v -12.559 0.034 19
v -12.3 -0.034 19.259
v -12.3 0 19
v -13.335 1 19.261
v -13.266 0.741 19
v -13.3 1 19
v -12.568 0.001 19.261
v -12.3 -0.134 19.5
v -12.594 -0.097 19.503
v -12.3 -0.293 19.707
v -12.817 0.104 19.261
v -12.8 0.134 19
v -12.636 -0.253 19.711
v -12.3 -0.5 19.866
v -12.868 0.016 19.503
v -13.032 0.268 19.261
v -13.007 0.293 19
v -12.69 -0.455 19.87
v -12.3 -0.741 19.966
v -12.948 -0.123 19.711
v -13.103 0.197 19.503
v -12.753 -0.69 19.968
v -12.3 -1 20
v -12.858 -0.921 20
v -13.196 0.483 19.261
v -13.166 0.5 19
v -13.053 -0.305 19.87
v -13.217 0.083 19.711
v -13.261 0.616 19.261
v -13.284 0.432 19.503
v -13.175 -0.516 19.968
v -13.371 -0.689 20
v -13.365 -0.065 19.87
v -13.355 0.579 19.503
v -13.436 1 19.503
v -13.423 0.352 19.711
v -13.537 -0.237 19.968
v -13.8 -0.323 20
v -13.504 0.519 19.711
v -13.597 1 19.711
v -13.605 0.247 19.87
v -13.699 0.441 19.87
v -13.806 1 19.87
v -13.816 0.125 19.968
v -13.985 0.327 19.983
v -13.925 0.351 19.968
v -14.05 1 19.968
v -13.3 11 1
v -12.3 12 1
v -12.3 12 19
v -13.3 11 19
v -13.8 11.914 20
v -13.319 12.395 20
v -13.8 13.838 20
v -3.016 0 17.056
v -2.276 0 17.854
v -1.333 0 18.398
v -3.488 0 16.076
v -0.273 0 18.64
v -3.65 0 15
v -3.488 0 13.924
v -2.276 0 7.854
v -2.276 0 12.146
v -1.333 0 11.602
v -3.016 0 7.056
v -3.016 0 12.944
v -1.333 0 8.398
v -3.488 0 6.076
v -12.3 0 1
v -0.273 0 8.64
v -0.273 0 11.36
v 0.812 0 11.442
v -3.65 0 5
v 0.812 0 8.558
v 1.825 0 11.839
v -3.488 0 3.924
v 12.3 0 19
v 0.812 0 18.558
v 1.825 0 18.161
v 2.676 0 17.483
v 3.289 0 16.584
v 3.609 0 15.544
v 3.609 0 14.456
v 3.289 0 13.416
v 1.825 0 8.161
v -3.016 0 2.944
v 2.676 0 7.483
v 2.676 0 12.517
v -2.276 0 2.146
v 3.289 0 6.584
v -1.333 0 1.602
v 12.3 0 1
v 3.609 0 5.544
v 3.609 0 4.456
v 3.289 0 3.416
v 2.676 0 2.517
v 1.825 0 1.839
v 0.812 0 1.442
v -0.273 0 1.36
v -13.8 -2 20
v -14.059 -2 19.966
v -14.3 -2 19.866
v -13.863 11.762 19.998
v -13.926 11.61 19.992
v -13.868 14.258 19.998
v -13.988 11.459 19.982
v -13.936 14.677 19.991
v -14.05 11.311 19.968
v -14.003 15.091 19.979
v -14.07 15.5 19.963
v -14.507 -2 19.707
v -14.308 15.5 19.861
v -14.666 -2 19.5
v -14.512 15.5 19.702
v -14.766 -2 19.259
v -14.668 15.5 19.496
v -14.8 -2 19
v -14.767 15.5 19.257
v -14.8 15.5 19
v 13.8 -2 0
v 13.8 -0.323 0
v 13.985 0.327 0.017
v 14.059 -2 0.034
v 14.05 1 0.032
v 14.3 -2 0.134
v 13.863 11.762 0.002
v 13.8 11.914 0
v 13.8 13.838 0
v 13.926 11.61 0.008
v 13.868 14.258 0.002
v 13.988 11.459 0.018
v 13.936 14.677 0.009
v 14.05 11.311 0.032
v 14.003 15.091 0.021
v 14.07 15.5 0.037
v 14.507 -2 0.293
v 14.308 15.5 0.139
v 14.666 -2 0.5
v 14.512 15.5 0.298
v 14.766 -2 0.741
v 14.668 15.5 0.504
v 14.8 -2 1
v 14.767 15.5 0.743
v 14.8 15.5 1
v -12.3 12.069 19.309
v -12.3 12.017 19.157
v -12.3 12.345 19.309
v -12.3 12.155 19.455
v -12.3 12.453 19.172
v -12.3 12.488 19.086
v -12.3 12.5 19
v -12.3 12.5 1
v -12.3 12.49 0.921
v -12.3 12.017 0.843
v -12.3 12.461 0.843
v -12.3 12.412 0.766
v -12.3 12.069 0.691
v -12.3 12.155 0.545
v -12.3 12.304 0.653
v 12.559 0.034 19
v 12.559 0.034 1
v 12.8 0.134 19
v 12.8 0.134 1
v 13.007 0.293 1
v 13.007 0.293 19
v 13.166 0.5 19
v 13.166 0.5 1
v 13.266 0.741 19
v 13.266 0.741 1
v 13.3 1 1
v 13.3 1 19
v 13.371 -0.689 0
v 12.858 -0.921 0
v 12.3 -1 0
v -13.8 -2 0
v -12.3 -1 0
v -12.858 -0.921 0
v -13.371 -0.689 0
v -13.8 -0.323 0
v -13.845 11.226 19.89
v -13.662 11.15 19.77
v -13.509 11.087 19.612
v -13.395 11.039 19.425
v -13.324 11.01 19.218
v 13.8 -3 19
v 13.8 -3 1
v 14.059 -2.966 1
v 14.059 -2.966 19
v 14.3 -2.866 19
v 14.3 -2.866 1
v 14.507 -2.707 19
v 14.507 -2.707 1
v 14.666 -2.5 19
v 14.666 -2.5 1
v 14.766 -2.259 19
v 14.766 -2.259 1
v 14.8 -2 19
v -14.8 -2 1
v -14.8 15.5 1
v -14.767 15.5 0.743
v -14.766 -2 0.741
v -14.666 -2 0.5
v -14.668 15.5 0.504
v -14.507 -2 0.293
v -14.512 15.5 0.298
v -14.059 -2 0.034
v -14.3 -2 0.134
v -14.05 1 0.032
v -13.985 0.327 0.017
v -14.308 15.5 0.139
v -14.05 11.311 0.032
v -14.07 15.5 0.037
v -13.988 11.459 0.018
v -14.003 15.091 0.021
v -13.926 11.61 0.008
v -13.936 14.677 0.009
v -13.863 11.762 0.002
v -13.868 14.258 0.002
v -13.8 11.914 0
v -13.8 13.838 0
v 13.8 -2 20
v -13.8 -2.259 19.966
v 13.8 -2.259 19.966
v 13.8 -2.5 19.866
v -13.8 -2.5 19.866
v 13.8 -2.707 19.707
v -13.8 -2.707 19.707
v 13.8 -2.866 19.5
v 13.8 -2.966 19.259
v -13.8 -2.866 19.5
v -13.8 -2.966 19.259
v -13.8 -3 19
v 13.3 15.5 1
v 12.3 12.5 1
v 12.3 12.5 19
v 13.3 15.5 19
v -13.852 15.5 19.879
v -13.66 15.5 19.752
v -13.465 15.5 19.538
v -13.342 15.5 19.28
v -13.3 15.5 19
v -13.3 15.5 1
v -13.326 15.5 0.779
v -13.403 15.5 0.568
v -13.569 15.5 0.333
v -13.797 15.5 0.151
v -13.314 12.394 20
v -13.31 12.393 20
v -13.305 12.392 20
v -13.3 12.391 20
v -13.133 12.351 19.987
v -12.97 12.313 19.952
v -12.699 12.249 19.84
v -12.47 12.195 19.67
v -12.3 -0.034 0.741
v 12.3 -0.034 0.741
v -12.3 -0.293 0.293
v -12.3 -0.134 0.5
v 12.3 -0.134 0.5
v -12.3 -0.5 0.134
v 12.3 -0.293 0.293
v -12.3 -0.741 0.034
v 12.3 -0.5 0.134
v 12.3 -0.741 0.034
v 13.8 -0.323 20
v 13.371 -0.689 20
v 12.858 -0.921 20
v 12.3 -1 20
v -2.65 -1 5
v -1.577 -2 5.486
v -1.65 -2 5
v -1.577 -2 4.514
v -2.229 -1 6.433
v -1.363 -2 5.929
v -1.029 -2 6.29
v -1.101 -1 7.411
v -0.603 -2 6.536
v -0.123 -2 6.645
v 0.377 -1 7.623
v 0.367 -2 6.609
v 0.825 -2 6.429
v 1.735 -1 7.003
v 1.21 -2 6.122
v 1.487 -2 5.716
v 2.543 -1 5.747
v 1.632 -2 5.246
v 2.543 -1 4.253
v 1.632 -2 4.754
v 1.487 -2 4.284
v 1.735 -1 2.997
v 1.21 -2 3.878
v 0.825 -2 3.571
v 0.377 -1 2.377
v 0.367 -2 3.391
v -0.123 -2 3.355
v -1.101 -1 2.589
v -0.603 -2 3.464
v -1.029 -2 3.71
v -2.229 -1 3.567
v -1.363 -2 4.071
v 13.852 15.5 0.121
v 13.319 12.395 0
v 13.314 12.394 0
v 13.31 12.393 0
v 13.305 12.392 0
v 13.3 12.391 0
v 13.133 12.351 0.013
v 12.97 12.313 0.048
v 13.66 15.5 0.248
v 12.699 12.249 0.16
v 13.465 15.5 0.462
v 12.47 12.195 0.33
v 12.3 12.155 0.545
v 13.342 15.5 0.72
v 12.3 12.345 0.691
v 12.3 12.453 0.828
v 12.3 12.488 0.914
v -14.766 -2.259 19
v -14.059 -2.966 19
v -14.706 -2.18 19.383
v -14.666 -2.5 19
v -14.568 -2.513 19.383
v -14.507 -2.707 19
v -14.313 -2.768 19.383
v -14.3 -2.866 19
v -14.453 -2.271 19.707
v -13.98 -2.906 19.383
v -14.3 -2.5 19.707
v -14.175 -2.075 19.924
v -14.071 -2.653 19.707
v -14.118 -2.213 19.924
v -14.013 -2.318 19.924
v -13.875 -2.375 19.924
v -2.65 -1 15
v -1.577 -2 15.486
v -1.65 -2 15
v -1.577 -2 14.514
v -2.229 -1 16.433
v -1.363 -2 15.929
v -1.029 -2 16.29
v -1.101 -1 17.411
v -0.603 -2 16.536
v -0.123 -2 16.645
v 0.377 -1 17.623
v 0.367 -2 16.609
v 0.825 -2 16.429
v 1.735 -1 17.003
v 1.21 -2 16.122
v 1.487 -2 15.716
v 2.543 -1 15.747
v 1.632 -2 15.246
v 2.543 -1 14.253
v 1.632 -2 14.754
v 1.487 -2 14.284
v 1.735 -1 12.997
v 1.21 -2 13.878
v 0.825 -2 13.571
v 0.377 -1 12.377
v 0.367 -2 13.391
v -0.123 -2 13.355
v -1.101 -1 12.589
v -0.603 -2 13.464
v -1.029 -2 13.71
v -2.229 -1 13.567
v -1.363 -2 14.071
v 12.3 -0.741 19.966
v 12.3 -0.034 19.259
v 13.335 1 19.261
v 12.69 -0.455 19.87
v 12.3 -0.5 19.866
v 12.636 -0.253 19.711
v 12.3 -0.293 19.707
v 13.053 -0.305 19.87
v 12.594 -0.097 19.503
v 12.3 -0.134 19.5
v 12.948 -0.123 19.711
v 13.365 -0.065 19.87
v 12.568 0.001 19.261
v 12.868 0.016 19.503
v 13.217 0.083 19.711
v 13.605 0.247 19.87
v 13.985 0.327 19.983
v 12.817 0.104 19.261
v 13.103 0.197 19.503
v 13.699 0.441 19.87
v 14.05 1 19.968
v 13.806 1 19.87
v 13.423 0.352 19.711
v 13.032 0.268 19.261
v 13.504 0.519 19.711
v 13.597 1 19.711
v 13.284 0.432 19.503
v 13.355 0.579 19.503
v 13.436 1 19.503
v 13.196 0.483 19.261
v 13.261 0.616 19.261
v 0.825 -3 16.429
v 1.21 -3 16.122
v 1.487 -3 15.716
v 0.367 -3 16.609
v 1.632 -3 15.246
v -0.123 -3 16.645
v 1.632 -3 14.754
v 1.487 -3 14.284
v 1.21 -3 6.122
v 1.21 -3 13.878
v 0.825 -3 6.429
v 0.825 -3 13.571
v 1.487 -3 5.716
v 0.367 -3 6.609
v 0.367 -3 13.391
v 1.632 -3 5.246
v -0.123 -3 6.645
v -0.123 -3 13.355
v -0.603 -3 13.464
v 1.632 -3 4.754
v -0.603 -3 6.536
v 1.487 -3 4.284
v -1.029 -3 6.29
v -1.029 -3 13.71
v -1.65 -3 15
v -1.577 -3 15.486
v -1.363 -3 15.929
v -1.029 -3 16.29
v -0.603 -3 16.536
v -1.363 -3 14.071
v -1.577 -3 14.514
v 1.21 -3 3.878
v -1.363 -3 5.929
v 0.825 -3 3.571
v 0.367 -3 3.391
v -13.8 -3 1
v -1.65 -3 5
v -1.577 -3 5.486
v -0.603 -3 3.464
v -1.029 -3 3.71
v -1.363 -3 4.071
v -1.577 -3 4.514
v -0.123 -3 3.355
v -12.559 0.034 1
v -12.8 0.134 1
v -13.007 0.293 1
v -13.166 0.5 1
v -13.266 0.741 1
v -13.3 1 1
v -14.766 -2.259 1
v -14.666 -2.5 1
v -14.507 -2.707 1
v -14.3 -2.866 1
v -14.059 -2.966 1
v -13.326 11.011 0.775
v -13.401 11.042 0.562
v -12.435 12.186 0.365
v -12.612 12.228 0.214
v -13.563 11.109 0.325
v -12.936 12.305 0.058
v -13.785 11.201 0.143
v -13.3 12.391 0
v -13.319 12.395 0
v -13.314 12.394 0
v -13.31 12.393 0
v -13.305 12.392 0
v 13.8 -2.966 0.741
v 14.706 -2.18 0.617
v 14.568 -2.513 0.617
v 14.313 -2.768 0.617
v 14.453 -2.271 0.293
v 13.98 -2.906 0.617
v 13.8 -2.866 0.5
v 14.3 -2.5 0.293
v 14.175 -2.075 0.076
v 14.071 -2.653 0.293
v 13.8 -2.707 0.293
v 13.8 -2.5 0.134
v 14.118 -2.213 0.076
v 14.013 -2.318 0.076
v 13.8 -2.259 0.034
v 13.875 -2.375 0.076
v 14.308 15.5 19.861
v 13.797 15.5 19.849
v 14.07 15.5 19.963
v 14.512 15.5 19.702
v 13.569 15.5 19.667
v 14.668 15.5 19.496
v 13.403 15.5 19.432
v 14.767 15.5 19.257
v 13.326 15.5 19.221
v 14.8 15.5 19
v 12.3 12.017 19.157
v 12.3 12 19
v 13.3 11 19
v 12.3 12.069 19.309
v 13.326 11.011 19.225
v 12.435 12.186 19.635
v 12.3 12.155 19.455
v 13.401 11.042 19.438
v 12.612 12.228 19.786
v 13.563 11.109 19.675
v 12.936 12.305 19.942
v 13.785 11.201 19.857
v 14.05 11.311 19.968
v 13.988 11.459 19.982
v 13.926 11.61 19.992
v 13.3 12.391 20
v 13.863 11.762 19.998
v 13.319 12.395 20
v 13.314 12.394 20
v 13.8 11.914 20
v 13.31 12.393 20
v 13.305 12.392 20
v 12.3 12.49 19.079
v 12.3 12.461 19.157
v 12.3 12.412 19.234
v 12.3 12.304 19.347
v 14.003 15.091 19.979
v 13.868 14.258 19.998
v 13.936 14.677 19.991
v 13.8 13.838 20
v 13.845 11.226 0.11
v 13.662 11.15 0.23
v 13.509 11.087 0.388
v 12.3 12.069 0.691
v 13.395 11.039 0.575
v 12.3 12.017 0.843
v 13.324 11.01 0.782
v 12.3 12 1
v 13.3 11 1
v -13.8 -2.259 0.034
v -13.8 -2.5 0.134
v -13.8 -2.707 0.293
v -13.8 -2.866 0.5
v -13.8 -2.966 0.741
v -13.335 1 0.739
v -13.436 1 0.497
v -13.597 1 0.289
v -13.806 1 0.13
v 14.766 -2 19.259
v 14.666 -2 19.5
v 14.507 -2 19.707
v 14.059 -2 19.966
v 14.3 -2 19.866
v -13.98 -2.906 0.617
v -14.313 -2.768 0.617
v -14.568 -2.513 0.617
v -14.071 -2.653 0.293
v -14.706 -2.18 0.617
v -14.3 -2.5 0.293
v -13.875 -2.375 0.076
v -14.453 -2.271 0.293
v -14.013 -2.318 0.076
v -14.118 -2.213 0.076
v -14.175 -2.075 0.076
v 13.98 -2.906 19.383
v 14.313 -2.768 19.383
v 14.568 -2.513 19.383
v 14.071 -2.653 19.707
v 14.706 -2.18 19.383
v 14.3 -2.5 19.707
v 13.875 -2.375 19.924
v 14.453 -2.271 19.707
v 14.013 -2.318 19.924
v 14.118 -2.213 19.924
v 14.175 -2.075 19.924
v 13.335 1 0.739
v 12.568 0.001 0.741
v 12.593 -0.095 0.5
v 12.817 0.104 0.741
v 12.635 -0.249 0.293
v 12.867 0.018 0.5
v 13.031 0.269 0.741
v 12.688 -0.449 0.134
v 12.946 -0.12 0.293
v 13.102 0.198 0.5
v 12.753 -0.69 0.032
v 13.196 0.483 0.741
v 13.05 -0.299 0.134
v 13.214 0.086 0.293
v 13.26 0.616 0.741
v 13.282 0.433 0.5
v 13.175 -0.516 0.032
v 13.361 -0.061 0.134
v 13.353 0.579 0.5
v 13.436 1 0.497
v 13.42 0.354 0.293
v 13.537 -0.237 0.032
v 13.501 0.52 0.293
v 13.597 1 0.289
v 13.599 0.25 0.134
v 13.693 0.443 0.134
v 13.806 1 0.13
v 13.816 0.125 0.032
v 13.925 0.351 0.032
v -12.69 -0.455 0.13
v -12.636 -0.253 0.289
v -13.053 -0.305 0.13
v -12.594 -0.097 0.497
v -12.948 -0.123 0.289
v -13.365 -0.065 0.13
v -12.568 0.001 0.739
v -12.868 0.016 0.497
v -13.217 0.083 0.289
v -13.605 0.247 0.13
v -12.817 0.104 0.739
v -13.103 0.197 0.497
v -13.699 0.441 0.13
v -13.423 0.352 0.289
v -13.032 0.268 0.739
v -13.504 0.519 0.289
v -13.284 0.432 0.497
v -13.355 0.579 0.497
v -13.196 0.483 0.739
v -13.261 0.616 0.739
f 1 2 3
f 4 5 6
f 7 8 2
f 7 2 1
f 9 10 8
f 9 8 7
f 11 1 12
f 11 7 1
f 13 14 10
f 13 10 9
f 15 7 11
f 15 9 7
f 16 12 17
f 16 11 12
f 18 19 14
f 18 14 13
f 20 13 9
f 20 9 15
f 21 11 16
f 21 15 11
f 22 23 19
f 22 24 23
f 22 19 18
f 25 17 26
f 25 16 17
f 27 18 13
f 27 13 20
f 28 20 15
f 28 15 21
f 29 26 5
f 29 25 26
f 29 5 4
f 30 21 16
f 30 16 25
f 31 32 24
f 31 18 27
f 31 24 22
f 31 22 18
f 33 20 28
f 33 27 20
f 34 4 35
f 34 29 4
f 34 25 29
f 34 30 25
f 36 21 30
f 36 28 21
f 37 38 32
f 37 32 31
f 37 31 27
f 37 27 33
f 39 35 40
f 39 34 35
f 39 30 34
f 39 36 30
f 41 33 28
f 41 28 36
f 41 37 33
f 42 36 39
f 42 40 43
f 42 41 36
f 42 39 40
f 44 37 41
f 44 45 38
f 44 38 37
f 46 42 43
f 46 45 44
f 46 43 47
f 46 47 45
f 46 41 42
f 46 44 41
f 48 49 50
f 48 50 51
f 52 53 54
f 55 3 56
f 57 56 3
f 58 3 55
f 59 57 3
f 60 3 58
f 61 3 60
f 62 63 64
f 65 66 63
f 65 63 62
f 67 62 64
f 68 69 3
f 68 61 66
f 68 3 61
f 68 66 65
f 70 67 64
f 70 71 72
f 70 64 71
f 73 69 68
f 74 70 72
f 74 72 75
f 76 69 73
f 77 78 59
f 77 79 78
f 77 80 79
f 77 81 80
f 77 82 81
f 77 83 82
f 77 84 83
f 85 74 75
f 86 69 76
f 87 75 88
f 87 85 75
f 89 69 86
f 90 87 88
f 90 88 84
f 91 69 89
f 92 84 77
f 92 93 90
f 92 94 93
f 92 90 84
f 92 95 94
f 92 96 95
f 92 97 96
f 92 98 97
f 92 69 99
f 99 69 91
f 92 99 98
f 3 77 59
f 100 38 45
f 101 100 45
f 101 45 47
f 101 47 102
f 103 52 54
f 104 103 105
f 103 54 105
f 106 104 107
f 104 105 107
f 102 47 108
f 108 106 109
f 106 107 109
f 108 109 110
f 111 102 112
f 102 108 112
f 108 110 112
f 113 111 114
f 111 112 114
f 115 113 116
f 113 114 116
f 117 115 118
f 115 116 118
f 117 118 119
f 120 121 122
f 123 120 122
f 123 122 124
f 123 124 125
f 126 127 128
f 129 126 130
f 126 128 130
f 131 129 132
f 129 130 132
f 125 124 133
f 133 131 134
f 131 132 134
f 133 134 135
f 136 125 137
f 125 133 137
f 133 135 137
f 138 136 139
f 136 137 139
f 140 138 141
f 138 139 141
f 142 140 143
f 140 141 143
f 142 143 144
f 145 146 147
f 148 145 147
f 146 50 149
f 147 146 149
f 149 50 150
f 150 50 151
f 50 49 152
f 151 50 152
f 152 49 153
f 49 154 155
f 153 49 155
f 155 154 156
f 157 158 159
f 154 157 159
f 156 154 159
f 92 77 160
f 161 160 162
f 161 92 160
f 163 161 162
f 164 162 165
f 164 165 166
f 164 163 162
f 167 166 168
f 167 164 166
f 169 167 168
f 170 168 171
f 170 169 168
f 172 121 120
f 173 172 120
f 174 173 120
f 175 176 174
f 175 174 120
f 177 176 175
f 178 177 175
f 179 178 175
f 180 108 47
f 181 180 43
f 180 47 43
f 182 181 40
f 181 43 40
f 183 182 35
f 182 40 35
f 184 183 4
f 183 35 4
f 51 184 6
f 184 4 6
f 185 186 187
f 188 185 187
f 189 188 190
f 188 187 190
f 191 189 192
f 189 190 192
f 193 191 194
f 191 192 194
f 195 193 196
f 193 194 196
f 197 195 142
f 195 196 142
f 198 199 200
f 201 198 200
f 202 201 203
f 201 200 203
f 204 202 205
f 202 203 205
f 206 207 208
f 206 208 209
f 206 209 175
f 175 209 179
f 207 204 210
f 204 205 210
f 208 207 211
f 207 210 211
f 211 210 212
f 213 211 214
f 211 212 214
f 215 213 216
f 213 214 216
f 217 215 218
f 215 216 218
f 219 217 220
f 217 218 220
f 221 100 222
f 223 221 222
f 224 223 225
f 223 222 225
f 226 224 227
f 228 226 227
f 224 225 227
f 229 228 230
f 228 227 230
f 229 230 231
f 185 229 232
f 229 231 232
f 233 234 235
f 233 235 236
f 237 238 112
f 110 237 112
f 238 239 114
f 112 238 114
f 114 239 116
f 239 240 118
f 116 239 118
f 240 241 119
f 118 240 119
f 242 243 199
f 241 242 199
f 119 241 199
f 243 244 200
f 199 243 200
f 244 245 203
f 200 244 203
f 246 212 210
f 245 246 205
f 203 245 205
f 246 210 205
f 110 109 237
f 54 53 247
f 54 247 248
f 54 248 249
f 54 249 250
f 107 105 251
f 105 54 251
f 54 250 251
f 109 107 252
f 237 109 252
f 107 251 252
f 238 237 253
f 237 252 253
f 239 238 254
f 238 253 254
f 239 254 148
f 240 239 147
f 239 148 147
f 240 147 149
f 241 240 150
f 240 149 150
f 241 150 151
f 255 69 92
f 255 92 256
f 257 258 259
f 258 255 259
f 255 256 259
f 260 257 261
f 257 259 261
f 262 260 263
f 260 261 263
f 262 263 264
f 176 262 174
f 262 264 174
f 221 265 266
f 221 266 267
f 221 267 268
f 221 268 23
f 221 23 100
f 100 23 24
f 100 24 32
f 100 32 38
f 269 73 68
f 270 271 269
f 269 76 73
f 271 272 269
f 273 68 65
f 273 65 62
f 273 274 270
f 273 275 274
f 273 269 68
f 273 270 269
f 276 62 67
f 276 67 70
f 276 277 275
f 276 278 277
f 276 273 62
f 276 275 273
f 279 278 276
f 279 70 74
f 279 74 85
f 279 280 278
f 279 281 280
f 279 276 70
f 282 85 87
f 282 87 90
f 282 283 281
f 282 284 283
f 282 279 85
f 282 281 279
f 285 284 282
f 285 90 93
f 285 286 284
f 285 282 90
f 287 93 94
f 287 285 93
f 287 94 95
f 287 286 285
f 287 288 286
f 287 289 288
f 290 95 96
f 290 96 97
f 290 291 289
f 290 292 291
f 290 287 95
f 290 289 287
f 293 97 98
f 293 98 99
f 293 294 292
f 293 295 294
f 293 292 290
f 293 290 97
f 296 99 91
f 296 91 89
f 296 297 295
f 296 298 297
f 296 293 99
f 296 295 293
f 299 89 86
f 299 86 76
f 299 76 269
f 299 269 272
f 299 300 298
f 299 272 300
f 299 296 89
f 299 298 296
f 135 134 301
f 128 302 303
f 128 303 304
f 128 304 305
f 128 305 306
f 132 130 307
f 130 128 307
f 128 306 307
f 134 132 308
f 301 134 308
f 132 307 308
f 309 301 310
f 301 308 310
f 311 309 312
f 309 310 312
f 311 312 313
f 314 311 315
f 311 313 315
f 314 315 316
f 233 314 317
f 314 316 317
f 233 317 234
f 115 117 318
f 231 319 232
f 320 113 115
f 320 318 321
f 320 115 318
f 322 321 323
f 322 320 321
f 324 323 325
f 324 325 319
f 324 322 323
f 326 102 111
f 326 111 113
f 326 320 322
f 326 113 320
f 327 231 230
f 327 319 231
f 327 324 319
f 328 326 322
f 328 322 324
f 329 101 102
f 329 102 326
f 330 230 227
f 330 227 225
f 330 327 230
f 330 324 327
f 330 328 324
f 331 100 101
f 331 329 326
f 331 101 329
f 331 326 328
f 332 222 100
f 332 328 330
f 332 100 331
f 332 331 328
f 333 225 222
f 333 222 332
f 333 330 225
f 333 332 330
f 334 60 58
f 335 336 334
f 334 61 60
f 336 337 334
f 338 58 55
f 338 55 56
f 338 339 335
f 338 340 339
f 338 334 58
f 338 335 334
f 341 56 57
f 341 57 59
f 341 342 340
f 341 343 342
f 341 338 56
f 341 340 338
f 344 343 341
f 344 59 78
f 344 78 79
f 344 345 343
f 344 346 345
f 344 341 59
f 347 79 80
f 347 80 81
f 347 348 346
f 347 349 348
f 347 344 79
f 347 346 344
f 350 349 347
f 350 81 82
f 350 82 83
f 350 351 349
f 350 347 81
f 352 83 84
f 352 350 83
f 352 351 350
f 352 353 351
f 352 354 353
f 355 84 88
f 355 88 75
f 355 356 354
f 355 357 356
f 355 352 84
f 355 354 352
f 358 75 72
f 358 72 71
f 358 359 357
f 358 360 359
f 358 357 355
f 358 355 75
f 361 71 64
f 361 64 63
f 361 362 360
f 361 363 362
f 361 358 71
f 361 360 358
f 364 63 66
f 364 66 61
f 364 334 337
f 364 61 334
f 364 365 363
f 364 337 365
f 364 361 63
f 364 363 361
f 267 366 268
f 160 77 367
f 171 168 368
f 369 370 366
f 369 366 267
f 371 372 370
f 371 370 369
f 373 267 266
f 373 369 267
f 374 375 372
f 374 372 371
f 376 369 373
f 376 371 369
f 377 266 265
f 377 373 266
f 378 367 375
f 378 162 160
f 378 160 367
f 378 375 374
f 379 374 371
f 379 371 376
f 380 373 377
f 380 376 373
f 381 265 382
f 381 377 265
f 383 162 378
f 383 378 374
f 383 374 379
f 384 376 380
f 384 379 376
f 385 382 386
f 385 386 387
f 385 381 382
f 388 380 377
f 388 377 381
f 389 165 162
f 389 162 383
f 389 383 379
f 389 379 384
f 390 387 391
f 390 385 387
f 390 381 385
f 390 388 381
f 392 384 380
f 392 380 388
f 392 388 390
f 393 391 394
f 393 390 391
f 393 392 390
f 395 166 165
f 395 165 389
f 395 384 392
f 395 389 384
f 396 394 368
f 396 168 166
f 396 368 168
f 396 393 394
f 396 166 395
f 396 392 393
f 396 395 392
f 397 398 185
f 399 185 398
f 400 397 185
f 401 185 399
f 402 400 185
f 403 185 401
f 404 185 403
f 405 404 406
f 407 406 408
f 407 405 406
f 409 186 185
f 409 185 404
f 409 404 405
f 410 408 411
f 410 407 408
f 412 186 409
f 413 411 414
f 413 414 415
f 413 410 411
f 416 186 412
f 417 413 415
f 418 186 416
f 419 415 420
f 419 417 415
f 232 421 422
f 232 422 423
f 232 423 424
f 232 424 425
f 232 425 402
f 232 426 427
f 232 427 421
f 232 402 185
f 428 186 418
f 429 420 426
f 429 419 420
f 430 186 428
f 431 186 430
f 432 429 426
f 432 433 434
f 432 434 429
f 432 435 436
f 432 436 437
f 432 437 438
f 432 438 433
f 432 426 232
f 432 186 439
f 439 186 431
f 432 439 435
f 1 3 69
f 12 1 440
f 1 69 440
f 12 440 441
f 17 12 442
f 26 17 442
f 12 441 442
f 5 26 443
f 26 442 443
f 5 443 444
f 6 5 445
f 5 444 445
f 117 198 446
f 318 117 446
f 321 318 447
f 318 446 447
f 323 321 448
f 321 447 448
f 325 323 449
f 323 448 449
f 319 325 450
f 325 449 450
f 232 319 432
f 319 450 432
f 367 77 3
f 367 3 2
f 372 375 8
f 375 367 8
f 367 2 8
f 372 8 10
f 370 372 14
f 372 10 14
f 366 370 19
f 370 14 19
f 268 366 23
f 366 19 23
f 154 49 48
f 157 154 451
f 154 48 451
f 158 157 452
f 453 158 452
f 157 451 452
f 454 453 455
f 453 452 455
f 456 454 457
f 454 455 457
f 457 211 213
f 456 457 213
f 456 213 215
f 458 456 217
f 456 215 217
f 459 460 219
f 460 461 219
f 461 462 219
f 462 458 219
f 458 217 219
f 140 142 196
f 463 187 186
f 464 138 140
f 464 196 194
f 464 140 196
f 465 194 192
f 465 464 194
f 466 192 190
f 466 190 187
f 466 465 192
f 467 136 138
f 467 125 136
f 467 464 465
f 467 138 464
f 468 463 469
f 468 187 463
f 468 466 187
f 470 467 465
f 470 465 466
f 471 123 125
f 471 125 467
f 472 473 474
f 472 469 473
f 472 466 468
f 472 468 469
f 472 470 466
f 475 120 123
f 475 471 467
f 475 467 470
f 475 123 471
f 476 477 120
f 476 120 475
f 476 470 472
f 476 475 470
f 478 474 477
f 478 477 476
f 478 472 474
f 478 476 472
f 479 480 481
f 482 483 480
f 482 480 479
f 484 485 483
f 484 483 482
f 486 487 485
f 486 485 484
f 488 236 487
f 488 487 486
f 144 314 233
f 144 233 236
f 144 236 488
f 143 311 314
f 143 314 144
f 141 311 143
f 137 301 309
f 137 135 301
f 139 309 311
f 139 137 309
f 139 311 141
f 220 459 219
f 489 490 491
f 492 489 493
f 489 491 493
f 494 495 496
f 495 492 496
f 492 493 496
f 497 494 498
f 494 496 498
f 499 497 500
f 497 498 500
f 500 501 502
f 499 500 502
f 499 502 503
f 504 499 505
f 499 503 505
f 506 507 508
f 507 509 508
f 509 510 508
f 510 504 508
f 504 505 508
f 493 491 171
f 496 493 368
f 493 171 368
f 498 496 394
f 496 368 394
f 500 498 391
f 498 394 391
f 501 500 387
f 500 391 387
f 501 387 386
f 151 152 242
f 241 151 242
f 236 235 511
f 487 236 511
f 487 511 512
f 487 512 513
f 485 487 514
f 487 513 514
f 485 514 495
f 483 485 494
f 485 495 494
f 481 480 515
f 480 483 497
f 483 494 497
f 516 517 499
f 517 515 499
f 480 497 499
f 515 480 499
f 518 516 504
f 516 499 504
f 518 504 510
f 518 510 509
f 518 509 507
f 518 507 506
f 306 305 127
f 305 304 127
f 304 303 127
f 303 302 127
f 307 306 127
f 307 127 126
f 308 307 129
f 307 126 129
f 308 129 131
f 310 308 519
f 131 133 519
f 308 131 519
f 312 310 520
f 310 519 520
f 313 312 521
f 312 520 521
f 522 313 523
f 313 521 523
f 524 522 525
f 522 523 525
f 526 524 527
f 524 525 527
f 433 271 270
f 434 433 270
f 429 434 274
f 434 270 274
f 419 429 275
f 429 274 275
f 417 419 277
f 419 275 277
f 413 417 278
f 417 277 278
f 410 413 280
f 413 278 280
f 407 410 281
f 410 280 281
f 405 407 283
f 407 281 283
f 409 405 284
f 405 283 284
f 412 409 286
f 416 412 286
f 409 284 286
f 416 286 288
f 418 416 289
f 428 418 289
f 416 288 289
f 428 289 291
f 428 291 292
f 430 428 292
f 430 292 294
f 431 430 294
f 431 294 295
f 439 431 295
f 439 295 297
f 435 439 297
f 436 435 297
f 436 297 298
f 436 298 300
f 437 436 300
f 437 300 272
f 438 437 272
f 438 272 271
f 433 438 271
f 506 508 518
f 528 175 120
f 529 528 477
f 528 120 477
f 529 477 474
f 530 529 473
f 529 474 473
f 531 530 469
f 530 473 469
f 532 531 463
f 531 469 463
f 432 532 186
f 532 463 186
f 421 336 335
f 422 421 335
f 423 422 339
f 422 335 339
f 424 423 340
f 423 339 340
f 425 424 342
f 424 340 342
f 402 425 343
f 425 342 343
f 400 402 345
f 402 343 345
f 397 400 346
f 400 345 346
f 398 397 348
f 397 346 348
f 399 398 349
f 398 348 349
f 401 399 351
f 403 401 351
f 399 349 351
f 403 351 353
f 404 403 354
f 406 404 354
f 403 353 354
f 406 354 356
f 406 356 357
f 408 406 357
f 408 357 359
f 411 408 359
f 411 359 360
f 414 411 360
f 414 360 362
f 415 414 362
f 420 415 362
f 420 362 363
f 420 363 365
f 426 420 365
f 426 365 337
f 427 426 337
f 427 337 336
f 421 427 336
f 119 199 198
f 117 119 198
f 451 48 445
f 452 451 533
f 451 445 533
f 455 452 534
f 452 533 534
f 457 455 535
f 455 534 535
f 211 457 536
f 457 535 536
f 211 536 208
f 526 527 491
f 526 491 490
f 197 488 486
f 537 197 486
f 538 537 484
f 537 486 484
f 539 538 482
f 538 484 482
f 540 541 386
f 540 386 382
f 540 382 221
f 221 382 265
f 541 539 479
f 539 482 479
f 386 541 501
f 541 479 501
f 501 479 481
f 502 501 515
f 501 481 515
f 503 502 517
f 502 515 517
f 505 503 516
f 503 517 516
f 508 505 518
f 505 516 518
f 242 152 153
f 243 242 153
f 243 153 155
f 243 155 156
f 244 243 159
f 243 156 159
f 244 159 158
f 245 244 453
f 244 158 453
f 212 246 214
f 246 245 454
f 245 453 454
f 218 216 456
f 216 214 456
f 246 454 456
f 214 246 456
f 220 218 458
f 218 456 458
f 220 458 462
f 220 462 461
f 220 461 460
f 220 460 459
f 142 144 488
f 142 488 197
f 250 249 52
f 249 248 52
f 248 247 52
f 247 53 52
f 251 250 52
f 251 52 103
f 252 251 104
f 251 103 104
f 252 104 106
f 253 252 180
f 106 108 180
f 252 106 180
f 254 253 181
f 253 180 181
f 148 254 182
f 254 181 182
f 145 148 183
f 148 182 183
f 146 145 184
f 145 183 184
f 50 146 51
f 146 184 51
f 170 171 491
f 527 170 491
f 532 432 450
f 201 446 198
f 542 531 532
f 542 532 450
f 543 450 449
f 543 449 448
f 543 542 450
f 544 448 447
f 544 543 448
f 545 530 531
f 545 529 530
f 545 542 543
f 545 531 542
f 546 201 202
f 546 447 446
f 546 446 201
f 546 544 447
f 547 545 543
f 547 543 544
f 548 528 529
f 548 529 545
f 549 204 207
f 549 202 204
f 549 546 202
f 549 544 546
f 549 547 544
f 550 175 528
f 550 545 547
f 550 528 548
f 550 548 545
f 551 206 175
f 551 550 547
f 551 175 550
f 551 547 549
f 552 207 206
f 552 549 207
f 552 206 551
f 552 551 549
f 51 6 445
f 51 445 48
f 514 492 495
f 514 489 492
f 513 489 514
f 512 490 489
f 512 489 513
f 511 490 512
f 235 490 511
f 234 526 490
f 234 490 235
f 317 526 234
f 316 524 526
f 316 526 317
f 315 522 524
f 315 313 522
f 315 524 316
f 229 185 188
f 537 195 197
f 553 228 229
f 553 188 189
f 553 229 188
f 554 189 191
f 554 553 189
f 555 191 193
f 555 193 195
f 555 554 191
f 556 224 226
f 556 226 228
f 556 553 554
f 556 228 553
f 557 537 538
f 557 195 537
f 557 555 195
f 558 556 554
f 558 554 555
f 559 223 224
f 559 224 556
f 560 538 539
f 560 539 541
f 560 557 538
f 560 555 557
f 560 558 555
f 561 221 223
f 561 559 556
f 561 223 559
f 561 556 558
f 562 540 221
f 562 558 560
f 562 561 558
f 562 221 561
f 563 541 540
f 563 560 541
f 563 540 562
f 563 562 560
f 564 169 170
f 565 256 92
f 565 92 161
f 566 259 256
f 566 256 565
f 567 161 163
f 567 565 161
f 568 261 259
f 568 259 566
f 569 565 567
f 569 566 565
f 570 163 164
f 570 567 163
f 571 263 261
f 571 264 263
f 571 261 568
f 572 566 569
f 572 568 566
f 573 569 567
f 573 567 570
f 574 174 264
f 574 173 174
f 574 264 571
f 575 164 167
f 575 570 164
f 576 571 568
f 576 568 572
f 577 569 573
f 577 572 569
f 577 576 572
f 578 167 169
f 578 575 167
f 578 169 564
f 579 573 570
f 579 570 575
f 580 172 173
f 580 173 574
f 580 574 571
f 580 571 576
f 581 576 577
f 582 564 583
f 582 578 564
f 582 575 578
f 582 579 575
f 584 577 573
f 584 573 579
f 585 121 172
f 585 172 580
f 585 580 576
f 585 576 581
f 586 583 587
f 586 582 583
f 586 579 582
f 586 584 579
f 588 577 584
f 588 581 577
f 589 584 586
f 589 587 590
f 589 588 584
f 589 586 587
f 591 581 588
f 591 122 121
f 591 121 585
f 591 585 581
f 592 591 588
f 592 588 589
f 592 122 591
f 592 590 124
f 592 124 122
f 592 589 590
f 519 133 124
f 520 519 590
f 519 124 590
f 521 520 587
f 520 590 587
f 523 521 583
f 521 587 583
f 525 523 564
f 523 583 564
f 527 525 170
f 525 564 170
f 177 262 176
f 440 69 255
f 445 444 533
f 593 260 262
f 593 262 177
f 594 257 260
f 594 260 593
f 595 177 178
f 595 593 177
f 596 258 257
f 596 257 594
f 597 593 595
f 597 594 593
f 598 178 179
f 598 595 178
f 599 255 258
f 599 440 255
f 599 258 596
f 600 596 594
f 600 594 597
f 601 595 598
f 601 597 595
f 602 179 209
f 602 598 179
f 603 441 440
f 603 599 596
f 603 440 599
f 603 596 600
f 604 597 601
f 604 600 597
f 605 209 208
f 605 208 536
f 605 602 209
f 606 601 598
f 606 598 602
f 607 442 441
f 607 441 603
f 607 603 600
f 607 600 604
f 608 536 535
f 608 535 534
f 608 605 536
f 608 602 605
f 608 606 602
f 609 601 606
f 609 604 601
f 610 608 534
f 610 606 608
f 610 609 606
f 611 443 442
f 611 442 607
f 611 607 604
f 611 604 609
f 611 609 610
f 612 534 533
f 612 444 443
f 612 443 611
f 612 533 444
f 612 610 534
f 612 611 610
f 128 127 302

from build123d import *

# Parameters (mm, degrees)
BOSS_EXTRUDE1_DEPTH = 20
SKETCH2_R           = 1.65
CUT_EXTRUDE1_DEPTH  = 20
FILLET2_R           = 1
CHAMFER1_SIZE       = 2


with BuildPart() as part:
    # Sketch1 → Boss-Extrude1 (new body)
    with BuildSketch(Plane.XY):
        with BuildLine():
            Line((0, 0), (-12.3, 0))
            ThreePointArc((-12.3, 0), (-13.007106781, 0.292893219), (-13.3, 1))
            Line((-13.3, 1), (-13.3, 11))
            Line((-13.3, 11), (-12.3, 12))
            Line((-12.3, 12), (-12.3, 12.5))
            Line((-12.3, 12.5), (-13.3, 15.5))
            Line((-13.3, 15.5), (-14.8, 15.5))
            Line((-14.8, 15.5), (-14.8, -3))
            Line((-14.8, -3), (0, -3))
            Line((0, -3), (0, 0))
        make_face()
    boss_extrude1 = extrude(amount=BOSS_EXTRUDE1_DEPTH)

    # Mirror1: Boss-Extrude1 across plane
    add(boss_extrude1.mirror(Plane(origin=(0, 0, 20), x_dir=(0, 0, 1), z_dir=(-1, 0, 0))))

    # Sketch2 → Cut-Extrude1 (cut)
    with BuildSketch(Plane(origin=(0, 0, 0), x_dir=(1, 0, 0), z_dir=(0, 1, 0))):
        with Locations(Location((0, -5, 0), (0, 0, 180))):
            Circle(SKETCH2_R)
        with Locations(Location((0, -15, 0), (0, 0, 180))):
            Circle(SKETCH2_R)
    extrude(amount=-CUT_EXTRUDE1_DEPTH, mode=Mode.SUBTRACT)

    # Fillet2
    # the kernel refuses this fillet: 1 mm, written as the material it takes off along each edge
    with BuildSketch(Plane(origin=(-13.8, -2, 1), x_dir=(-1, 0, 0), z_dir=(0, 0, -1))) as fillet2_piece_1_section:
        Polygon((0, 0), (FILLET2_R, 0), (FILLET2_R, -FILLET2_R), (0, -FILLET2_R), align=None)
    fillet2_piece_1 = extrude(amount=FILLET2_R, mode=Mode.PRIVATE)
    fillet2_piece_1 = fillet2_piece_1 - Plane(origin=(-13.8, -2, 1), x_dir=(0.7071067811865475, 0.7071067811865475, 0), z_dir=(0, 0, -1)) * Sphere(FILLET2_R, mode=Mode.PRIVATE)
    add(fillet2_piece_1, mode=Mode.SUBTRACT)
    with BuildSketch(Plane(origin=(13.8, -2, 1), x_dir=(0, -1, 0), z_dir=(0, 0, -1))) as fillet2_piece_2_section:
        Polygon((0, 0), (FILLET2_R, 0), (FILLET2_R, -FILLET2_R), (0, -FILLET2_R), align=None)
    fillet2_piece_2 = extrude(amount=FILLET2_R, mode=Mode.PRIVATE)
    fillet2_piece_2 = fillet2_piece_2 - Plane(origin=(13.8, -2, 1), x_dir=(-0.7071067811865476, 0.7071067811865475, 0), z_dir=(0, 0, -1)) * Sphere(FILLET2_R, mode=Mode.PRIVATE)
    add(fillet2_piece_2, mode=Mode.SUBTRACT)
    with BuildSketch(Plane(origin=(13.8, -2, 19), x_dir=(0, -1, 0), z_dir=(0, 0, 1))) as fillet2_piece_3_section:
        Polygon((0, 0), (FILLET2_R, 0), (FILLET2_R, FILLET2_R), (0, FILLET2_R), align=None)
    fillet2_piece_3 = extrude(amount=FILLET2_R, mode=Mode.PRIVATE)
    fillet2_piece_3 = fillet2_piece_3 - Plane(origin=(13.8, -2, 19), x_dir=(-0.7071067811865476, 0.7071067811865475, 0), z_dir=(0, 0, 1)) * Sphere(FILLET2_R, mode=Mode.PRIVATE)
    add(fillet2_piece_3, mode=Mode.SUBTRACT)
    with BuildSketch(Plane(origin=(-13.8, -2, 19), x_dir=(-1, 0, 0), z_dir=(0, 0, 1))) as fillet2_piece_4_section:
        Polygon((0, 0), (FILLET2_R, 0), (FILLET2_R, FILLET2_R), (0, FILLET2_R), align=None)
    fillet2_piece_4 = extrude(amount=FILLET2_R, mode=Mode.PRIVATE)
    fillet2_piece_4 = fillet2_piece_4 - Plane(origin=(-13.8, -2, 19), x_dir=(0.7071067811865475, 0.7071067811865475, 0), z_dir=(0, 0, 1)) * Sphere(FILLET2_R, mode=Mode.PRIVATE)
    add(fillet2_piece_4, mode=Mode.SUBTRACT)
    with BuildSketch(Plane(origin=(-12.3, 1, 0), x_dir=(0, -1, 0), z_dir=(1, 0, 0))) as fillet2_piece_5:
        with BuildLine():
            CenterArc((1 + FILLET2_R, -FILLET2_R), FILLET2_R, 90, 90)
            Line((1 + FILLET2_R, 0), (1, 0))
            Line((1, 0), (1, -FILLET2_R))
        make_face()
    revolve(axis=Axis((-12.3, 1, 0), (0, 0, -1)), revolution_arc=90, mode=Mode.SUBTRACT)
    with BuildSketch(Plane(origin=(-13.3, 1, 0), x_dir=(-1, 0, 0), z_dir=(0, 1, 0))) as fillet2_piece_6_section:
        with BuildLine():
            CenterArc((FILLET2_R, FILLET2_R), FILLET2_R, 180, 90)
            Line((0, FILLET2_R), (0, 0))
            Line((0, 0), (FILLET2_R, 0))
        make_face()
    fillet2_piece_6 = extrude(amount=12.5, mode=Mode.PRIVATE)
    fillet2_piece_6 = split(fillet2_piece_6, bisect_by=Plane(origin=(-15.966229844, 8.333770156, 0.229204386), z_dir=(0.7071067811865476, -0.7071067811865476, 0)), keep=Keep.TOP, mode=Mode.PRIVATE)
    add(fillet2_piece_6, mode=Mode.SUBTRACT)
    with BuildSketch(Plane(origin=(-15.067766953, 9.232233047, 0), x_dir=(-0.7071067811865476, 0.7071067811865476, 0), z_dir=(0.7071067811865476, 0.7071067811865476, 0))) as fillet2_piece_7_section:
        with BuildLine():
            CenterArc((FILLET2_R, FILLET2_R), FILLET2_R, 180, 90)
            Line((0, FILLET2_R), (0, 0))
            Line((0, 0), (FILLET2_R, 0))
        make_face()
    fillet2_piece_7 = extrude(amount=6.414213562, mode=Mode.PRIVATE)
    fillet2_piece_7 = split(fillet2_piece_7, bisect_by=Plane(origin=(-13.3, 12.610644527, 0.233840359), z_dir=(1, 0, 0)), keep=Keep.TOP, mode=Mode.PRIVATE)
    add(fillet2_piece_7, mode=Mode.SUBTRACT)
    with BuildSketch(Plane(origin=(-11.509430585, 10.128291755, 0), x_dir=(-0.948683298050514, -0.31622776601683744, 0), z_dir=(-0.31622776601683744, 0.948683298050514, 0)), Plane(origin=(11.509430585, 10.128291755, 20), x_dir=(0.9486832980505141, -0.3162277660168372, 0), z_dir=(0.3162277660168372, 0.9486832980505141, 0))) as fillet2_piece_8:
        with BuildLine():
            CenterArc((FILLET2_R, FILLET2_R), FILLET2_R, 180, 90)
            Line((0, FILLET2_R), (0, 0))
            Line((0, 0), (FILLET2_R, 0))
        make_face()
    extrude(amount=8.16227766, mode=Mode.SUBTRACT)
    with BuildSketch(Plane(origin=(-14.8, 18, 0), x_dir=(1, 0, 0), z_dir=(0, -1, 0)), Plane(origin=(14.8, 18, 20), x_dir=(-1, 0, 0), z_dir=(0, -1, 0))) as fillet2_piece_9:
        with BuildLine():
            CenterArc((FILLET2_R, FILLET2_R), FILLET2_R, 180, 90)
            Line((0, FILLET2_R), (0, 0))
            Line((0, 0), (FILLET2_R, 0))
        make_face()
    extrude(amount=20, mode=Mode.SUBTRACT)
    with BuildSketch(Plane(origin=(13.8, -3, 0), x_dir=(0, 1, 0), z_dir=(-1, 0, 0)), Plane(origin=(-13.8, -3, 20), x_dir=(0, 1, 0), z_dir=(1, 0, 0))) as fillet2_piece_10:
        with BuildLine():
            CenterArc((FILLET2_R, -FILLET2_R), FILLET2_R, 90, 90)
            Line((0, -FILLET2_R), (0, 0))
            Line((0, 0), (FILLET2_R, 0))
        make_face()
    extrude(amount=27.6, mode=Mode.SUBTRACT)
    with BuildSketch(Plane(origin=(14.8, 18, 0), x_dir=(-1, 0, 0), z_dir=(0, -1, 0)), Plane(origin=(-14.8, 18, 20), x_dir=(1, 0, 0), z_dir=(0, -1, 0))) as fillet2_piece_11:
        with BuildLine():
            CenterArc((FILLET2_R, -FILLET2_R), FILLET2_R, 90, 90)
            Line((0, -FILLET2_R), (0, 0))
            Line((0, 0), (FILLET2_R, 0))
        make_face()
    extrude(amount=20, mode=Mode.SUBTRACT)
    with BuildSketch(Plane(origin=(11.509430585, 10.128291755, 0), x_dir=(0.9486832980505141, -0.3162277660168372, 0), z_dir=(0.3162277660168372, 0.9486832980505141, 0)), Plane(origin=(-11.509430585, 10.128291755, 20), x_dir=(-0.948683298050514, -0.31622776601683744, 0), z_dir=(-0.31622776601683744, 0.948683298050514, 0))) as fillet2_piece_12:
        with BuildLine():
            CenterArc((FILLET2_R, -FILLET2_R), FILLET2_R, 90, 90)
            Line((0, -FILLET2_R), (0, 0))
            Line((0, 0), (FILLET2_R, 0))
        make_face()
    extrude(amount=8.16227766, mode=Mode.SUBTRACT)
    with BuildSketch(Plane(origin=(15.067766953, 9.232233047, 0), x_dir=(0.7071067811865474, 0.7071067811865478, 0), z_dir=(-0.7071067811865478, 0.7071067811865474, 0))) as fillet2_piece_13_section:
        with BuildLine():
            CenterArc((FILLET2_R, -FILLET2_R), FILLET2_R, 90, 90)
            Line((0, -FILLET2_R), (0, 0))
            Line((0, 0), (FILLET2_R, 0))
        make_face()
    fillet2_piece_13 = extrude(amount=6.414213562, mode=Mode.PRIVATE)
    fillet2_piece_13 = split(fillet2_piece_13, bisect_by=Plane(origin=(13.3, 12.610644527, 0.233840359), z_dir=(-1, 0, 0)), keep=Keep.TOP, mode=Mode.PRIVATE)
    add(fillet2_piece_13, mode=Mode.SUBTRACT)
    with BuildSketch(Plane(origin=(15.067766953, 9.232233047, 20), x_dir=(0.7071067811865474, 0.7071067811865478, 0), z_dir=(-0.7071067811865478, 0.7071067811865474, 0))) as fillet2_piece_14_section:
        with BuildLine():
            CenterArc((FILLET2_R, FILLET2_R), FILLET2_R, 180, 90)
            Line((0, FILLET2_R), (0, 0))
            Line((0, 0), (FILLET2_R, 0))
        make_face()
    fillet2_piece_14 = extrude(amount=6.414213562, mode=Mode.PRIVATE)
    fillet2_piece_14 = split(fillet2_piece_14, bisect_by=Plane(origin=(13.3, 12.610644527, 19.766159641), z_dir=(-1, 0, 0)), keep=Keep.TOP, mode=Mode.PRIVATE)
    add(fillet2_piece_14, mode=Mode.SUBTRACT)
    with BuildSketch(Plane(origin=(13.3, 1, 0), x_dir=(1, 0, 0), z_dir=(0, 1, 0))) as fillet2_piece_15_section:
        with BuildLine():
            CenterArc((FILLET2_R, -FILLET2_R), FILLET2_R, 90, 90)
            Line((0, -FILLET2_R), (0, 0))
            Line((0, 0), (FILLET2_R, 0))
        make_face()
    fillet2_piece_15 = extrude(amount=12.5, mode=Mode.PRIVATE)
    fillet2_piece_15 = split(fillet2_piece_15, bisect_by=Plane(origin=(15.966229844, 8.333770156, 0.229204386), z_dir=(-0.7071067811865474, -0.7071067811865478, 0)), keep=Keep.TOP, mode=Mode.PRIVATE)
    add(fillet2_piece_15, mode=Mode.SUBTRACT)
    with BuildSketch(Plane(origin=(13.3, 1, 20), x_dir=(1, 0, 0), z_dir=(0, 1, 0))) as fillet2_piece_16_section:
        with BuildLine():
            CenterArc((FILLET2_R, FILLET2_R), FILLET2_R, 180, 90)
            Line((0, FILLET2_R), (0, 0))
            Line((0, 0), (FILLET2_R, 0))
        make_face()
    fillet2_piece_16 = extrude(amount=12.5, mode=Mode.PRIVATE)
    fillet2_piece_16 = split(fillet2_piece_16, bisect_by=Plane(origin=(15.966229844, 8.333770156, 19.770795614), z_dir=(-0.7071067811865474, -0.7071067811865478, 0)), keep=Keep.TOP, mode=Mode.PRIVATE)
    add(fillet2_piece_16, mode=Mode.SUBTRACT)
    with BuildSketch(Plane(origin=(12.3, 1, 0), x_dir=(0, -1, 0), z_dir=(-1, 0, 0))) as fillet2_piece_17:
        with BuildLine():
            CenterArc((1 + FILLET2_R, FILLET2_R), FILLET2_R, 180, 90)
            Line((1, FILLET2_R), (1, 0))
            Line((1, 0), (1 + FILLET2_R, 0))
        make_face()
    revolve(axis=Axis((12.3, 1, 0), (0, 0, 1)), revolution_arc=90, mode=Mode.SUBTRACT)
    with BuildSketch(Plane(origin=(12.3, 1, 20), x_dir=(0, -1, 0), z_dir=(-1, 0, 0))) as fillet2_piece_18:
        with BuildLine():
            CenterArc((1 + FILLET2_R, -FILLET2_R), FILLET2_R, 90, 90)
            Line((1, -FILLET2_R), (1, 0))
            Line((1, 0), (1 + FILLET2_R, 0))
        make_face()
    revolve(axis=Axis((12.3, 1, 20), (0, 0, 1)), revolution_arc=90, mode=Mode.SUBTRACT)
    with BuildSketch(Plane(origin=(12.3, 0, 0), x_dir=(0, 0, 1), z_dir=(-1, 0, 0)), Plane(origin=(-12.3, 0, 20), x_dir=(0, 0, -1), z_dir=(1, 0, 0))) as fillet2_piece_19:
        with BuildLine():
            CenterArc((FILLET2_R, -FILLET2_R), FILLET2_R, 90, 90)
            Line((0, -FILLET2_R), (0, 0))
            Line((0, 0), (FILLET2_R, 0))
        make_face()
    extrude(amount=24.6, mode=Mode.SUBTRACT)
    with BuildSketch(Plane(origin=(-15.067766953, 9.232233047, 20), x_dir=(-0.7071067811865476, 0.7071067811865476, 0), z_dir=(0.7071067811865476, 0.7071067811865476, 0))) as fillet2_piece_20_section:
        with BuildLine():
            CenterArc((FILLET2_R, -FILLET2_R), FILLET2_R, 90, 90)
            Line((0, -FILLET2_R), (0, 0))
            Line((0, 0), (FILLET2_R, 0))
        make_face()
    fillet2_piece_20 = extrude(amount=6.414213562, mode=Mode.PRIVATE)
    fillet2_piece_20 = split(fillet2_piece_20, bisect_by=Plane(origin=(-13.3, 12.610644527, 19.766159641), z_dir=(1, 0, 0)), keep=Keep.TOP, mode=Mode.PRIVATE)
    add(fillet2_piece_20, mode=Mode.SUBTRACT)
    with BuildSketch(Plane(origin=(-13.3, 1, 20), x_dir=(-1, 0, 0), z_dir=(0, 1, 0))) as fillet2_piece_21_section:
        with BuildLine():
            CenterArc((FILLET2_R, -FILLET2_R), FILLET2_R, 90, 90)
            Line((0, -FILLET2_R), (0, 0))
            Line((0, 0), (FILLET2_R, 0))
        make_face()
    fillet2_piece_21 = extrude(amount=12.5, mode=Mode.PRIVATE)
    fillet2_piece_21 = split(fillet2_piece_21, bisect_by=Plane(origin=(-15.966229844, 8.333770156, 19.770795614), z_dir=(0.7071067811865476, -0.7071067811865476, 0)), keep=Keep.TOP, mode=Mode.PRIVATE)
    add(fillet2_piece_21, mode=Mode.SUBTRACT)
    with BuildSketch(Plane(origin=(-12.3, 1, 20), x_dir=(0, -1, 0), z_dir=(1, 0, 0))) as fillet2_piece_22:
        with BuildLine():
            CenterArc((1 + FILLET2_R, FILLET2_R), FILLET2_R, 180, 90)
            Line((1 + FILLET2_R, 0), (1, 0))
            Line((1, 0), (1, FILLET2_R))
        make_face()
    revolve(axis=Axis((-12.3, 1, 20), (0, 0, -1)), revolution_arc=90, mode=Mode.SUBTRACT)
    with BuildSketch(Plane(origin=(14.8, -3, 1), x_dir=(-1, 0, 0), z_dir=(0, 0, 1)), Plane(origin=(-14.8, -3, 1), x_dir=(0, 1, 0), z_dir=(0, 0, 1))) as fillet2_piece_23:
        with BuildLine():
            CenterArc((FILLET2_R, -FILLET2_R), FILLET2_R, 90, 90)
            Line((0, -FILLET2_R), (0, 0))
            Line((0, 0), (FILLET2_R, 0))
        make_face()
    extrude(amount=18, mode=Mode.SUBTRACT)
    with BuildSketch(Plane(origin=(-13.3, 1, 0), x_dir=(-1, 0, 0), z_dir=(0, 1, 0))) as fillet2_piece_24a_section:
        with BuildLine():
            CenterArc((FILLET2_R, FILLET2_R), FILLET2_R, 180, 90)
            Line((0, FILLET2_R), (0, 0))
            Line((0, 0), (FILLET2_R, 0))
        make_face()
    fillet2_piece_24a = extrude(amount=12.5, mode=Mode.PRIVATE)
    fillet2_piece_24a = split(fillet2_piece_24a, bisect_by=Plane(origin=(-12.857581525, 11.442418475, 0.216324413), z_dir=(-0.7071067811865476, 0.7071067811865476, 0)), keep=Keep.TOP, mode=Mode.PRIVATE)
    with BuildSketch(Plane(origin=(-15.067766953, 9.232233047, 0), x_dir=(-0.7071067811865476, 0.7071067811865476, 0), z_dir=(0.7071067811865476, 0.7071067811865476, 0))) as fillet2_piece_24b_section:
        with BuildLine():
            CenterArc((FILLET2_R, FILLET2_R), FILLET2_R, 180, 90)
            Line((0, FILLET2_R), (0, 0))
            Line((0, 0), (FILLET2_R, 0))
        make_face()
    fillet2_piece_24b = extrude(amount=6.414213562, mode=Mode.PRIVATE)
    fillet2_piece_24b = split(fillet2_piece_24b, bisect_by=Plane(origin=(-13.3, 10.374325792, 0.216324413), z_dir=(-1, 0, 0)), keep=Keep.TOP, mode=Mode.PRIVATE)
    fillet2_piece_24 = fillet2_piece_24a & fillet2_piece_24b
    add(fillet2_piece_24, mode=Mode.SUBTRACT)
    with BuildSketch(Plane(origin=(15.067766953, 9.232233047, 0), x_dir=(0.7071067811865474, 0.7071067811865478, 0), z_dir=(-0.7071067811865478, 0.7071067811865474, 0))) as fillet2_piece_25a_section:
        with BuildLine():
            CenterArc((FILLET2_R, -FILLET2_R), FILLET2_R, 90, 90)
            Line((0, -FILLET2_R), (0, 0))
            Line((0, 0), (FILLET2_R, 0))
        make_face()
    fillet2_piece_25a = extrude(amount=6.414213562, mode=Mode.PRIVATE)
    fillet2_piece_25a = split(fillet2_piece_25a, bisect_by=Plane(origin=(13.3, 10.374325792, 0.216324413), z_dir=(1, 0, 0)), keep=Keep.TOP, mode=Mode.PRIVATE)
    with BuildSketch(Plane(origin=(13.3, 1, 0), x_dir=(1, 0, 0), z_dir=(0, 1, 0))) as fillet2_piece_25b_section:
        with BuildLine():
            CenterArc((FILLET2_R, -FILLET2_R), FILLET2_R, 90, 90)
            Line((0, -FILLET2_R), (0, 0))
            Line((0, 0), (FILLET2_R, 0))
        make_face()
    fillet2_piece_25b = extrude(amount=12.5, mode=Mode.PRIVATE)
    fillet2_piece_25b = split(fillet2_piece_25b, bisect_by=Plane(origin=(12.857581525, 11.442418475, 0.216324413), z_dir=(0.7071067811865474, 0.7071067811865478, 0)), keep=Keep.TOP, mode=Mode.PRIVATE)
    fillet2_piece_25 = fillet2_piece_25a & fillet2_piece_25b
    add(fillet2_piece_25, mode=Mode.SUBTRACT)
    with BuildSketch(Plane(origin=(15.067766953, 9.232233047, 20), x_dir=(0.7071067811865474, 0.7071067811865478, 0), z_dir=(-0.7071067811865478, 0.7071067811865474, 0))) as fillet2_piece_26a_section:
        with BuildLine():
            CenterArc((FILLET2_R, FILLET2_R), FILLET2_R, 180, 90)
            Line((0, FILLET2_R), (0, 0))
            Line((0, 0), (FILLET2_R, 0))
        make_face()
    fillet2_piece_26a = extrude(amount=6.414213562, mode=Mode.PRIVATE)
    fillet2_piece_26a = split(fillet2_piece_26a, bisect_by=Plane(origin=(13.3, 10.374325792, 19.783675587), z_dir=(1, 0, 0)), keep=Keep.TOP, mode=Mode.PRIVATE)
    with BuildSketch(Plane(origin=(13.3, 1, 20), x_dir=(1, 0, 0), z_dir=(0, 1, 0))) as fillet2_piece_26b_section:
        with BuildLine():
            CenterArc((FILLET2_R, FILLET2_R), FILLET2_R, 180, 90)
            Line((0, FILLET2_R), (0, 0))
            Line((0, 0), (FILLET2_R, 0))
        make_face()
    fillet2_piece_26b = extrude(amount=12.5, mode=Mode.PRIVATE)
    fillet2_piece_26b = split(fillet2_piece_26b, bisect_by=Plane(origin=(12.857581525, 11.442418475, 19.783675587), z_dir=(0.7071067811865474, 0.7071067811865478, 0)), keep=Keep.TOP, mode=Mode.PRIVATE)
    fillet2_piece_26 = fillet2_piece_26a & fillet2_piece_26b
    add(fillet2_piece_26, mode=Mode.SUBTRACT)
    with BuildSketch(Plane(origin=(-13.3, 1, 20), x_dir=(-1, 0, 0), z_dir=(0, 1, 0))) as fillet2_piece_27a_section:
        with BuildLine():
            CenterArc((FILLET2_R, -FILLET2_R), FILLET2_R, 90, 90)
            Line((0, -FILLET2_R), (0, 0))
            Line((0, 0), (FILLET2_R, 0))
        make_face()
    fillet2_piece_27a = extrude(amount=12.5, mode=Mode.PRIVATE)
    fillet2_piece_27a = split(fillet2_piece_27a, bisect_by=Plane(origin=(-12.857581525, 11.442418475, 19.783675587), z_dir=(-0.7071067811865476, 0.7071067811865476, 0)), keep=Keep.TOP, mode=Mode.PRIVATE)
    with BuildSketch(Plane(origin=(-15.067766953, 9.232233047, 20), x_dir=(-0.7071067811865476, 0.7071067811865476, 0), z_dir=(0.7071067811865476, 0.7071067811865476, 0))) as fillet2_piece_27b_section:
        with BuildLine():
            CenterArc((FILLET2_R, -FILLET2_R), FILLET2_R, 90, 90)
            Line((0, -FILLET2_R), (0, 0))
            Line((0, 0), (FILLET2_R, 0))
        make_face()
    fillet2_piece_27b = extrude(amount=6.414213562, mode=Mode.PRIVATE)
    fillet2_piece_27b = split(fillet2_piece_27b, bisect_by=Plane(origin=(-13.3, 10.374325792, 19.783675587), z_dir=(-1, 0, 0)), keep=Keep.TOP, mode=Mode.PRIVATE)
    fillet2_piece_27 = fillet2_piece_27a & fillet2_piece_27b
    add(fillet2_piece_27, mode=Mode.SUBTRACT)

    # Chamfer1
    chamfer1_edges = [part.edges().sort_by_distance(p)[0] for p in [
        (1.65, 0, 5),
        (1.65, 0, 15),
    ]]
    chamfer(chamfer1_edges, length=CHAMFER1_SIZE)


solid = part.part
